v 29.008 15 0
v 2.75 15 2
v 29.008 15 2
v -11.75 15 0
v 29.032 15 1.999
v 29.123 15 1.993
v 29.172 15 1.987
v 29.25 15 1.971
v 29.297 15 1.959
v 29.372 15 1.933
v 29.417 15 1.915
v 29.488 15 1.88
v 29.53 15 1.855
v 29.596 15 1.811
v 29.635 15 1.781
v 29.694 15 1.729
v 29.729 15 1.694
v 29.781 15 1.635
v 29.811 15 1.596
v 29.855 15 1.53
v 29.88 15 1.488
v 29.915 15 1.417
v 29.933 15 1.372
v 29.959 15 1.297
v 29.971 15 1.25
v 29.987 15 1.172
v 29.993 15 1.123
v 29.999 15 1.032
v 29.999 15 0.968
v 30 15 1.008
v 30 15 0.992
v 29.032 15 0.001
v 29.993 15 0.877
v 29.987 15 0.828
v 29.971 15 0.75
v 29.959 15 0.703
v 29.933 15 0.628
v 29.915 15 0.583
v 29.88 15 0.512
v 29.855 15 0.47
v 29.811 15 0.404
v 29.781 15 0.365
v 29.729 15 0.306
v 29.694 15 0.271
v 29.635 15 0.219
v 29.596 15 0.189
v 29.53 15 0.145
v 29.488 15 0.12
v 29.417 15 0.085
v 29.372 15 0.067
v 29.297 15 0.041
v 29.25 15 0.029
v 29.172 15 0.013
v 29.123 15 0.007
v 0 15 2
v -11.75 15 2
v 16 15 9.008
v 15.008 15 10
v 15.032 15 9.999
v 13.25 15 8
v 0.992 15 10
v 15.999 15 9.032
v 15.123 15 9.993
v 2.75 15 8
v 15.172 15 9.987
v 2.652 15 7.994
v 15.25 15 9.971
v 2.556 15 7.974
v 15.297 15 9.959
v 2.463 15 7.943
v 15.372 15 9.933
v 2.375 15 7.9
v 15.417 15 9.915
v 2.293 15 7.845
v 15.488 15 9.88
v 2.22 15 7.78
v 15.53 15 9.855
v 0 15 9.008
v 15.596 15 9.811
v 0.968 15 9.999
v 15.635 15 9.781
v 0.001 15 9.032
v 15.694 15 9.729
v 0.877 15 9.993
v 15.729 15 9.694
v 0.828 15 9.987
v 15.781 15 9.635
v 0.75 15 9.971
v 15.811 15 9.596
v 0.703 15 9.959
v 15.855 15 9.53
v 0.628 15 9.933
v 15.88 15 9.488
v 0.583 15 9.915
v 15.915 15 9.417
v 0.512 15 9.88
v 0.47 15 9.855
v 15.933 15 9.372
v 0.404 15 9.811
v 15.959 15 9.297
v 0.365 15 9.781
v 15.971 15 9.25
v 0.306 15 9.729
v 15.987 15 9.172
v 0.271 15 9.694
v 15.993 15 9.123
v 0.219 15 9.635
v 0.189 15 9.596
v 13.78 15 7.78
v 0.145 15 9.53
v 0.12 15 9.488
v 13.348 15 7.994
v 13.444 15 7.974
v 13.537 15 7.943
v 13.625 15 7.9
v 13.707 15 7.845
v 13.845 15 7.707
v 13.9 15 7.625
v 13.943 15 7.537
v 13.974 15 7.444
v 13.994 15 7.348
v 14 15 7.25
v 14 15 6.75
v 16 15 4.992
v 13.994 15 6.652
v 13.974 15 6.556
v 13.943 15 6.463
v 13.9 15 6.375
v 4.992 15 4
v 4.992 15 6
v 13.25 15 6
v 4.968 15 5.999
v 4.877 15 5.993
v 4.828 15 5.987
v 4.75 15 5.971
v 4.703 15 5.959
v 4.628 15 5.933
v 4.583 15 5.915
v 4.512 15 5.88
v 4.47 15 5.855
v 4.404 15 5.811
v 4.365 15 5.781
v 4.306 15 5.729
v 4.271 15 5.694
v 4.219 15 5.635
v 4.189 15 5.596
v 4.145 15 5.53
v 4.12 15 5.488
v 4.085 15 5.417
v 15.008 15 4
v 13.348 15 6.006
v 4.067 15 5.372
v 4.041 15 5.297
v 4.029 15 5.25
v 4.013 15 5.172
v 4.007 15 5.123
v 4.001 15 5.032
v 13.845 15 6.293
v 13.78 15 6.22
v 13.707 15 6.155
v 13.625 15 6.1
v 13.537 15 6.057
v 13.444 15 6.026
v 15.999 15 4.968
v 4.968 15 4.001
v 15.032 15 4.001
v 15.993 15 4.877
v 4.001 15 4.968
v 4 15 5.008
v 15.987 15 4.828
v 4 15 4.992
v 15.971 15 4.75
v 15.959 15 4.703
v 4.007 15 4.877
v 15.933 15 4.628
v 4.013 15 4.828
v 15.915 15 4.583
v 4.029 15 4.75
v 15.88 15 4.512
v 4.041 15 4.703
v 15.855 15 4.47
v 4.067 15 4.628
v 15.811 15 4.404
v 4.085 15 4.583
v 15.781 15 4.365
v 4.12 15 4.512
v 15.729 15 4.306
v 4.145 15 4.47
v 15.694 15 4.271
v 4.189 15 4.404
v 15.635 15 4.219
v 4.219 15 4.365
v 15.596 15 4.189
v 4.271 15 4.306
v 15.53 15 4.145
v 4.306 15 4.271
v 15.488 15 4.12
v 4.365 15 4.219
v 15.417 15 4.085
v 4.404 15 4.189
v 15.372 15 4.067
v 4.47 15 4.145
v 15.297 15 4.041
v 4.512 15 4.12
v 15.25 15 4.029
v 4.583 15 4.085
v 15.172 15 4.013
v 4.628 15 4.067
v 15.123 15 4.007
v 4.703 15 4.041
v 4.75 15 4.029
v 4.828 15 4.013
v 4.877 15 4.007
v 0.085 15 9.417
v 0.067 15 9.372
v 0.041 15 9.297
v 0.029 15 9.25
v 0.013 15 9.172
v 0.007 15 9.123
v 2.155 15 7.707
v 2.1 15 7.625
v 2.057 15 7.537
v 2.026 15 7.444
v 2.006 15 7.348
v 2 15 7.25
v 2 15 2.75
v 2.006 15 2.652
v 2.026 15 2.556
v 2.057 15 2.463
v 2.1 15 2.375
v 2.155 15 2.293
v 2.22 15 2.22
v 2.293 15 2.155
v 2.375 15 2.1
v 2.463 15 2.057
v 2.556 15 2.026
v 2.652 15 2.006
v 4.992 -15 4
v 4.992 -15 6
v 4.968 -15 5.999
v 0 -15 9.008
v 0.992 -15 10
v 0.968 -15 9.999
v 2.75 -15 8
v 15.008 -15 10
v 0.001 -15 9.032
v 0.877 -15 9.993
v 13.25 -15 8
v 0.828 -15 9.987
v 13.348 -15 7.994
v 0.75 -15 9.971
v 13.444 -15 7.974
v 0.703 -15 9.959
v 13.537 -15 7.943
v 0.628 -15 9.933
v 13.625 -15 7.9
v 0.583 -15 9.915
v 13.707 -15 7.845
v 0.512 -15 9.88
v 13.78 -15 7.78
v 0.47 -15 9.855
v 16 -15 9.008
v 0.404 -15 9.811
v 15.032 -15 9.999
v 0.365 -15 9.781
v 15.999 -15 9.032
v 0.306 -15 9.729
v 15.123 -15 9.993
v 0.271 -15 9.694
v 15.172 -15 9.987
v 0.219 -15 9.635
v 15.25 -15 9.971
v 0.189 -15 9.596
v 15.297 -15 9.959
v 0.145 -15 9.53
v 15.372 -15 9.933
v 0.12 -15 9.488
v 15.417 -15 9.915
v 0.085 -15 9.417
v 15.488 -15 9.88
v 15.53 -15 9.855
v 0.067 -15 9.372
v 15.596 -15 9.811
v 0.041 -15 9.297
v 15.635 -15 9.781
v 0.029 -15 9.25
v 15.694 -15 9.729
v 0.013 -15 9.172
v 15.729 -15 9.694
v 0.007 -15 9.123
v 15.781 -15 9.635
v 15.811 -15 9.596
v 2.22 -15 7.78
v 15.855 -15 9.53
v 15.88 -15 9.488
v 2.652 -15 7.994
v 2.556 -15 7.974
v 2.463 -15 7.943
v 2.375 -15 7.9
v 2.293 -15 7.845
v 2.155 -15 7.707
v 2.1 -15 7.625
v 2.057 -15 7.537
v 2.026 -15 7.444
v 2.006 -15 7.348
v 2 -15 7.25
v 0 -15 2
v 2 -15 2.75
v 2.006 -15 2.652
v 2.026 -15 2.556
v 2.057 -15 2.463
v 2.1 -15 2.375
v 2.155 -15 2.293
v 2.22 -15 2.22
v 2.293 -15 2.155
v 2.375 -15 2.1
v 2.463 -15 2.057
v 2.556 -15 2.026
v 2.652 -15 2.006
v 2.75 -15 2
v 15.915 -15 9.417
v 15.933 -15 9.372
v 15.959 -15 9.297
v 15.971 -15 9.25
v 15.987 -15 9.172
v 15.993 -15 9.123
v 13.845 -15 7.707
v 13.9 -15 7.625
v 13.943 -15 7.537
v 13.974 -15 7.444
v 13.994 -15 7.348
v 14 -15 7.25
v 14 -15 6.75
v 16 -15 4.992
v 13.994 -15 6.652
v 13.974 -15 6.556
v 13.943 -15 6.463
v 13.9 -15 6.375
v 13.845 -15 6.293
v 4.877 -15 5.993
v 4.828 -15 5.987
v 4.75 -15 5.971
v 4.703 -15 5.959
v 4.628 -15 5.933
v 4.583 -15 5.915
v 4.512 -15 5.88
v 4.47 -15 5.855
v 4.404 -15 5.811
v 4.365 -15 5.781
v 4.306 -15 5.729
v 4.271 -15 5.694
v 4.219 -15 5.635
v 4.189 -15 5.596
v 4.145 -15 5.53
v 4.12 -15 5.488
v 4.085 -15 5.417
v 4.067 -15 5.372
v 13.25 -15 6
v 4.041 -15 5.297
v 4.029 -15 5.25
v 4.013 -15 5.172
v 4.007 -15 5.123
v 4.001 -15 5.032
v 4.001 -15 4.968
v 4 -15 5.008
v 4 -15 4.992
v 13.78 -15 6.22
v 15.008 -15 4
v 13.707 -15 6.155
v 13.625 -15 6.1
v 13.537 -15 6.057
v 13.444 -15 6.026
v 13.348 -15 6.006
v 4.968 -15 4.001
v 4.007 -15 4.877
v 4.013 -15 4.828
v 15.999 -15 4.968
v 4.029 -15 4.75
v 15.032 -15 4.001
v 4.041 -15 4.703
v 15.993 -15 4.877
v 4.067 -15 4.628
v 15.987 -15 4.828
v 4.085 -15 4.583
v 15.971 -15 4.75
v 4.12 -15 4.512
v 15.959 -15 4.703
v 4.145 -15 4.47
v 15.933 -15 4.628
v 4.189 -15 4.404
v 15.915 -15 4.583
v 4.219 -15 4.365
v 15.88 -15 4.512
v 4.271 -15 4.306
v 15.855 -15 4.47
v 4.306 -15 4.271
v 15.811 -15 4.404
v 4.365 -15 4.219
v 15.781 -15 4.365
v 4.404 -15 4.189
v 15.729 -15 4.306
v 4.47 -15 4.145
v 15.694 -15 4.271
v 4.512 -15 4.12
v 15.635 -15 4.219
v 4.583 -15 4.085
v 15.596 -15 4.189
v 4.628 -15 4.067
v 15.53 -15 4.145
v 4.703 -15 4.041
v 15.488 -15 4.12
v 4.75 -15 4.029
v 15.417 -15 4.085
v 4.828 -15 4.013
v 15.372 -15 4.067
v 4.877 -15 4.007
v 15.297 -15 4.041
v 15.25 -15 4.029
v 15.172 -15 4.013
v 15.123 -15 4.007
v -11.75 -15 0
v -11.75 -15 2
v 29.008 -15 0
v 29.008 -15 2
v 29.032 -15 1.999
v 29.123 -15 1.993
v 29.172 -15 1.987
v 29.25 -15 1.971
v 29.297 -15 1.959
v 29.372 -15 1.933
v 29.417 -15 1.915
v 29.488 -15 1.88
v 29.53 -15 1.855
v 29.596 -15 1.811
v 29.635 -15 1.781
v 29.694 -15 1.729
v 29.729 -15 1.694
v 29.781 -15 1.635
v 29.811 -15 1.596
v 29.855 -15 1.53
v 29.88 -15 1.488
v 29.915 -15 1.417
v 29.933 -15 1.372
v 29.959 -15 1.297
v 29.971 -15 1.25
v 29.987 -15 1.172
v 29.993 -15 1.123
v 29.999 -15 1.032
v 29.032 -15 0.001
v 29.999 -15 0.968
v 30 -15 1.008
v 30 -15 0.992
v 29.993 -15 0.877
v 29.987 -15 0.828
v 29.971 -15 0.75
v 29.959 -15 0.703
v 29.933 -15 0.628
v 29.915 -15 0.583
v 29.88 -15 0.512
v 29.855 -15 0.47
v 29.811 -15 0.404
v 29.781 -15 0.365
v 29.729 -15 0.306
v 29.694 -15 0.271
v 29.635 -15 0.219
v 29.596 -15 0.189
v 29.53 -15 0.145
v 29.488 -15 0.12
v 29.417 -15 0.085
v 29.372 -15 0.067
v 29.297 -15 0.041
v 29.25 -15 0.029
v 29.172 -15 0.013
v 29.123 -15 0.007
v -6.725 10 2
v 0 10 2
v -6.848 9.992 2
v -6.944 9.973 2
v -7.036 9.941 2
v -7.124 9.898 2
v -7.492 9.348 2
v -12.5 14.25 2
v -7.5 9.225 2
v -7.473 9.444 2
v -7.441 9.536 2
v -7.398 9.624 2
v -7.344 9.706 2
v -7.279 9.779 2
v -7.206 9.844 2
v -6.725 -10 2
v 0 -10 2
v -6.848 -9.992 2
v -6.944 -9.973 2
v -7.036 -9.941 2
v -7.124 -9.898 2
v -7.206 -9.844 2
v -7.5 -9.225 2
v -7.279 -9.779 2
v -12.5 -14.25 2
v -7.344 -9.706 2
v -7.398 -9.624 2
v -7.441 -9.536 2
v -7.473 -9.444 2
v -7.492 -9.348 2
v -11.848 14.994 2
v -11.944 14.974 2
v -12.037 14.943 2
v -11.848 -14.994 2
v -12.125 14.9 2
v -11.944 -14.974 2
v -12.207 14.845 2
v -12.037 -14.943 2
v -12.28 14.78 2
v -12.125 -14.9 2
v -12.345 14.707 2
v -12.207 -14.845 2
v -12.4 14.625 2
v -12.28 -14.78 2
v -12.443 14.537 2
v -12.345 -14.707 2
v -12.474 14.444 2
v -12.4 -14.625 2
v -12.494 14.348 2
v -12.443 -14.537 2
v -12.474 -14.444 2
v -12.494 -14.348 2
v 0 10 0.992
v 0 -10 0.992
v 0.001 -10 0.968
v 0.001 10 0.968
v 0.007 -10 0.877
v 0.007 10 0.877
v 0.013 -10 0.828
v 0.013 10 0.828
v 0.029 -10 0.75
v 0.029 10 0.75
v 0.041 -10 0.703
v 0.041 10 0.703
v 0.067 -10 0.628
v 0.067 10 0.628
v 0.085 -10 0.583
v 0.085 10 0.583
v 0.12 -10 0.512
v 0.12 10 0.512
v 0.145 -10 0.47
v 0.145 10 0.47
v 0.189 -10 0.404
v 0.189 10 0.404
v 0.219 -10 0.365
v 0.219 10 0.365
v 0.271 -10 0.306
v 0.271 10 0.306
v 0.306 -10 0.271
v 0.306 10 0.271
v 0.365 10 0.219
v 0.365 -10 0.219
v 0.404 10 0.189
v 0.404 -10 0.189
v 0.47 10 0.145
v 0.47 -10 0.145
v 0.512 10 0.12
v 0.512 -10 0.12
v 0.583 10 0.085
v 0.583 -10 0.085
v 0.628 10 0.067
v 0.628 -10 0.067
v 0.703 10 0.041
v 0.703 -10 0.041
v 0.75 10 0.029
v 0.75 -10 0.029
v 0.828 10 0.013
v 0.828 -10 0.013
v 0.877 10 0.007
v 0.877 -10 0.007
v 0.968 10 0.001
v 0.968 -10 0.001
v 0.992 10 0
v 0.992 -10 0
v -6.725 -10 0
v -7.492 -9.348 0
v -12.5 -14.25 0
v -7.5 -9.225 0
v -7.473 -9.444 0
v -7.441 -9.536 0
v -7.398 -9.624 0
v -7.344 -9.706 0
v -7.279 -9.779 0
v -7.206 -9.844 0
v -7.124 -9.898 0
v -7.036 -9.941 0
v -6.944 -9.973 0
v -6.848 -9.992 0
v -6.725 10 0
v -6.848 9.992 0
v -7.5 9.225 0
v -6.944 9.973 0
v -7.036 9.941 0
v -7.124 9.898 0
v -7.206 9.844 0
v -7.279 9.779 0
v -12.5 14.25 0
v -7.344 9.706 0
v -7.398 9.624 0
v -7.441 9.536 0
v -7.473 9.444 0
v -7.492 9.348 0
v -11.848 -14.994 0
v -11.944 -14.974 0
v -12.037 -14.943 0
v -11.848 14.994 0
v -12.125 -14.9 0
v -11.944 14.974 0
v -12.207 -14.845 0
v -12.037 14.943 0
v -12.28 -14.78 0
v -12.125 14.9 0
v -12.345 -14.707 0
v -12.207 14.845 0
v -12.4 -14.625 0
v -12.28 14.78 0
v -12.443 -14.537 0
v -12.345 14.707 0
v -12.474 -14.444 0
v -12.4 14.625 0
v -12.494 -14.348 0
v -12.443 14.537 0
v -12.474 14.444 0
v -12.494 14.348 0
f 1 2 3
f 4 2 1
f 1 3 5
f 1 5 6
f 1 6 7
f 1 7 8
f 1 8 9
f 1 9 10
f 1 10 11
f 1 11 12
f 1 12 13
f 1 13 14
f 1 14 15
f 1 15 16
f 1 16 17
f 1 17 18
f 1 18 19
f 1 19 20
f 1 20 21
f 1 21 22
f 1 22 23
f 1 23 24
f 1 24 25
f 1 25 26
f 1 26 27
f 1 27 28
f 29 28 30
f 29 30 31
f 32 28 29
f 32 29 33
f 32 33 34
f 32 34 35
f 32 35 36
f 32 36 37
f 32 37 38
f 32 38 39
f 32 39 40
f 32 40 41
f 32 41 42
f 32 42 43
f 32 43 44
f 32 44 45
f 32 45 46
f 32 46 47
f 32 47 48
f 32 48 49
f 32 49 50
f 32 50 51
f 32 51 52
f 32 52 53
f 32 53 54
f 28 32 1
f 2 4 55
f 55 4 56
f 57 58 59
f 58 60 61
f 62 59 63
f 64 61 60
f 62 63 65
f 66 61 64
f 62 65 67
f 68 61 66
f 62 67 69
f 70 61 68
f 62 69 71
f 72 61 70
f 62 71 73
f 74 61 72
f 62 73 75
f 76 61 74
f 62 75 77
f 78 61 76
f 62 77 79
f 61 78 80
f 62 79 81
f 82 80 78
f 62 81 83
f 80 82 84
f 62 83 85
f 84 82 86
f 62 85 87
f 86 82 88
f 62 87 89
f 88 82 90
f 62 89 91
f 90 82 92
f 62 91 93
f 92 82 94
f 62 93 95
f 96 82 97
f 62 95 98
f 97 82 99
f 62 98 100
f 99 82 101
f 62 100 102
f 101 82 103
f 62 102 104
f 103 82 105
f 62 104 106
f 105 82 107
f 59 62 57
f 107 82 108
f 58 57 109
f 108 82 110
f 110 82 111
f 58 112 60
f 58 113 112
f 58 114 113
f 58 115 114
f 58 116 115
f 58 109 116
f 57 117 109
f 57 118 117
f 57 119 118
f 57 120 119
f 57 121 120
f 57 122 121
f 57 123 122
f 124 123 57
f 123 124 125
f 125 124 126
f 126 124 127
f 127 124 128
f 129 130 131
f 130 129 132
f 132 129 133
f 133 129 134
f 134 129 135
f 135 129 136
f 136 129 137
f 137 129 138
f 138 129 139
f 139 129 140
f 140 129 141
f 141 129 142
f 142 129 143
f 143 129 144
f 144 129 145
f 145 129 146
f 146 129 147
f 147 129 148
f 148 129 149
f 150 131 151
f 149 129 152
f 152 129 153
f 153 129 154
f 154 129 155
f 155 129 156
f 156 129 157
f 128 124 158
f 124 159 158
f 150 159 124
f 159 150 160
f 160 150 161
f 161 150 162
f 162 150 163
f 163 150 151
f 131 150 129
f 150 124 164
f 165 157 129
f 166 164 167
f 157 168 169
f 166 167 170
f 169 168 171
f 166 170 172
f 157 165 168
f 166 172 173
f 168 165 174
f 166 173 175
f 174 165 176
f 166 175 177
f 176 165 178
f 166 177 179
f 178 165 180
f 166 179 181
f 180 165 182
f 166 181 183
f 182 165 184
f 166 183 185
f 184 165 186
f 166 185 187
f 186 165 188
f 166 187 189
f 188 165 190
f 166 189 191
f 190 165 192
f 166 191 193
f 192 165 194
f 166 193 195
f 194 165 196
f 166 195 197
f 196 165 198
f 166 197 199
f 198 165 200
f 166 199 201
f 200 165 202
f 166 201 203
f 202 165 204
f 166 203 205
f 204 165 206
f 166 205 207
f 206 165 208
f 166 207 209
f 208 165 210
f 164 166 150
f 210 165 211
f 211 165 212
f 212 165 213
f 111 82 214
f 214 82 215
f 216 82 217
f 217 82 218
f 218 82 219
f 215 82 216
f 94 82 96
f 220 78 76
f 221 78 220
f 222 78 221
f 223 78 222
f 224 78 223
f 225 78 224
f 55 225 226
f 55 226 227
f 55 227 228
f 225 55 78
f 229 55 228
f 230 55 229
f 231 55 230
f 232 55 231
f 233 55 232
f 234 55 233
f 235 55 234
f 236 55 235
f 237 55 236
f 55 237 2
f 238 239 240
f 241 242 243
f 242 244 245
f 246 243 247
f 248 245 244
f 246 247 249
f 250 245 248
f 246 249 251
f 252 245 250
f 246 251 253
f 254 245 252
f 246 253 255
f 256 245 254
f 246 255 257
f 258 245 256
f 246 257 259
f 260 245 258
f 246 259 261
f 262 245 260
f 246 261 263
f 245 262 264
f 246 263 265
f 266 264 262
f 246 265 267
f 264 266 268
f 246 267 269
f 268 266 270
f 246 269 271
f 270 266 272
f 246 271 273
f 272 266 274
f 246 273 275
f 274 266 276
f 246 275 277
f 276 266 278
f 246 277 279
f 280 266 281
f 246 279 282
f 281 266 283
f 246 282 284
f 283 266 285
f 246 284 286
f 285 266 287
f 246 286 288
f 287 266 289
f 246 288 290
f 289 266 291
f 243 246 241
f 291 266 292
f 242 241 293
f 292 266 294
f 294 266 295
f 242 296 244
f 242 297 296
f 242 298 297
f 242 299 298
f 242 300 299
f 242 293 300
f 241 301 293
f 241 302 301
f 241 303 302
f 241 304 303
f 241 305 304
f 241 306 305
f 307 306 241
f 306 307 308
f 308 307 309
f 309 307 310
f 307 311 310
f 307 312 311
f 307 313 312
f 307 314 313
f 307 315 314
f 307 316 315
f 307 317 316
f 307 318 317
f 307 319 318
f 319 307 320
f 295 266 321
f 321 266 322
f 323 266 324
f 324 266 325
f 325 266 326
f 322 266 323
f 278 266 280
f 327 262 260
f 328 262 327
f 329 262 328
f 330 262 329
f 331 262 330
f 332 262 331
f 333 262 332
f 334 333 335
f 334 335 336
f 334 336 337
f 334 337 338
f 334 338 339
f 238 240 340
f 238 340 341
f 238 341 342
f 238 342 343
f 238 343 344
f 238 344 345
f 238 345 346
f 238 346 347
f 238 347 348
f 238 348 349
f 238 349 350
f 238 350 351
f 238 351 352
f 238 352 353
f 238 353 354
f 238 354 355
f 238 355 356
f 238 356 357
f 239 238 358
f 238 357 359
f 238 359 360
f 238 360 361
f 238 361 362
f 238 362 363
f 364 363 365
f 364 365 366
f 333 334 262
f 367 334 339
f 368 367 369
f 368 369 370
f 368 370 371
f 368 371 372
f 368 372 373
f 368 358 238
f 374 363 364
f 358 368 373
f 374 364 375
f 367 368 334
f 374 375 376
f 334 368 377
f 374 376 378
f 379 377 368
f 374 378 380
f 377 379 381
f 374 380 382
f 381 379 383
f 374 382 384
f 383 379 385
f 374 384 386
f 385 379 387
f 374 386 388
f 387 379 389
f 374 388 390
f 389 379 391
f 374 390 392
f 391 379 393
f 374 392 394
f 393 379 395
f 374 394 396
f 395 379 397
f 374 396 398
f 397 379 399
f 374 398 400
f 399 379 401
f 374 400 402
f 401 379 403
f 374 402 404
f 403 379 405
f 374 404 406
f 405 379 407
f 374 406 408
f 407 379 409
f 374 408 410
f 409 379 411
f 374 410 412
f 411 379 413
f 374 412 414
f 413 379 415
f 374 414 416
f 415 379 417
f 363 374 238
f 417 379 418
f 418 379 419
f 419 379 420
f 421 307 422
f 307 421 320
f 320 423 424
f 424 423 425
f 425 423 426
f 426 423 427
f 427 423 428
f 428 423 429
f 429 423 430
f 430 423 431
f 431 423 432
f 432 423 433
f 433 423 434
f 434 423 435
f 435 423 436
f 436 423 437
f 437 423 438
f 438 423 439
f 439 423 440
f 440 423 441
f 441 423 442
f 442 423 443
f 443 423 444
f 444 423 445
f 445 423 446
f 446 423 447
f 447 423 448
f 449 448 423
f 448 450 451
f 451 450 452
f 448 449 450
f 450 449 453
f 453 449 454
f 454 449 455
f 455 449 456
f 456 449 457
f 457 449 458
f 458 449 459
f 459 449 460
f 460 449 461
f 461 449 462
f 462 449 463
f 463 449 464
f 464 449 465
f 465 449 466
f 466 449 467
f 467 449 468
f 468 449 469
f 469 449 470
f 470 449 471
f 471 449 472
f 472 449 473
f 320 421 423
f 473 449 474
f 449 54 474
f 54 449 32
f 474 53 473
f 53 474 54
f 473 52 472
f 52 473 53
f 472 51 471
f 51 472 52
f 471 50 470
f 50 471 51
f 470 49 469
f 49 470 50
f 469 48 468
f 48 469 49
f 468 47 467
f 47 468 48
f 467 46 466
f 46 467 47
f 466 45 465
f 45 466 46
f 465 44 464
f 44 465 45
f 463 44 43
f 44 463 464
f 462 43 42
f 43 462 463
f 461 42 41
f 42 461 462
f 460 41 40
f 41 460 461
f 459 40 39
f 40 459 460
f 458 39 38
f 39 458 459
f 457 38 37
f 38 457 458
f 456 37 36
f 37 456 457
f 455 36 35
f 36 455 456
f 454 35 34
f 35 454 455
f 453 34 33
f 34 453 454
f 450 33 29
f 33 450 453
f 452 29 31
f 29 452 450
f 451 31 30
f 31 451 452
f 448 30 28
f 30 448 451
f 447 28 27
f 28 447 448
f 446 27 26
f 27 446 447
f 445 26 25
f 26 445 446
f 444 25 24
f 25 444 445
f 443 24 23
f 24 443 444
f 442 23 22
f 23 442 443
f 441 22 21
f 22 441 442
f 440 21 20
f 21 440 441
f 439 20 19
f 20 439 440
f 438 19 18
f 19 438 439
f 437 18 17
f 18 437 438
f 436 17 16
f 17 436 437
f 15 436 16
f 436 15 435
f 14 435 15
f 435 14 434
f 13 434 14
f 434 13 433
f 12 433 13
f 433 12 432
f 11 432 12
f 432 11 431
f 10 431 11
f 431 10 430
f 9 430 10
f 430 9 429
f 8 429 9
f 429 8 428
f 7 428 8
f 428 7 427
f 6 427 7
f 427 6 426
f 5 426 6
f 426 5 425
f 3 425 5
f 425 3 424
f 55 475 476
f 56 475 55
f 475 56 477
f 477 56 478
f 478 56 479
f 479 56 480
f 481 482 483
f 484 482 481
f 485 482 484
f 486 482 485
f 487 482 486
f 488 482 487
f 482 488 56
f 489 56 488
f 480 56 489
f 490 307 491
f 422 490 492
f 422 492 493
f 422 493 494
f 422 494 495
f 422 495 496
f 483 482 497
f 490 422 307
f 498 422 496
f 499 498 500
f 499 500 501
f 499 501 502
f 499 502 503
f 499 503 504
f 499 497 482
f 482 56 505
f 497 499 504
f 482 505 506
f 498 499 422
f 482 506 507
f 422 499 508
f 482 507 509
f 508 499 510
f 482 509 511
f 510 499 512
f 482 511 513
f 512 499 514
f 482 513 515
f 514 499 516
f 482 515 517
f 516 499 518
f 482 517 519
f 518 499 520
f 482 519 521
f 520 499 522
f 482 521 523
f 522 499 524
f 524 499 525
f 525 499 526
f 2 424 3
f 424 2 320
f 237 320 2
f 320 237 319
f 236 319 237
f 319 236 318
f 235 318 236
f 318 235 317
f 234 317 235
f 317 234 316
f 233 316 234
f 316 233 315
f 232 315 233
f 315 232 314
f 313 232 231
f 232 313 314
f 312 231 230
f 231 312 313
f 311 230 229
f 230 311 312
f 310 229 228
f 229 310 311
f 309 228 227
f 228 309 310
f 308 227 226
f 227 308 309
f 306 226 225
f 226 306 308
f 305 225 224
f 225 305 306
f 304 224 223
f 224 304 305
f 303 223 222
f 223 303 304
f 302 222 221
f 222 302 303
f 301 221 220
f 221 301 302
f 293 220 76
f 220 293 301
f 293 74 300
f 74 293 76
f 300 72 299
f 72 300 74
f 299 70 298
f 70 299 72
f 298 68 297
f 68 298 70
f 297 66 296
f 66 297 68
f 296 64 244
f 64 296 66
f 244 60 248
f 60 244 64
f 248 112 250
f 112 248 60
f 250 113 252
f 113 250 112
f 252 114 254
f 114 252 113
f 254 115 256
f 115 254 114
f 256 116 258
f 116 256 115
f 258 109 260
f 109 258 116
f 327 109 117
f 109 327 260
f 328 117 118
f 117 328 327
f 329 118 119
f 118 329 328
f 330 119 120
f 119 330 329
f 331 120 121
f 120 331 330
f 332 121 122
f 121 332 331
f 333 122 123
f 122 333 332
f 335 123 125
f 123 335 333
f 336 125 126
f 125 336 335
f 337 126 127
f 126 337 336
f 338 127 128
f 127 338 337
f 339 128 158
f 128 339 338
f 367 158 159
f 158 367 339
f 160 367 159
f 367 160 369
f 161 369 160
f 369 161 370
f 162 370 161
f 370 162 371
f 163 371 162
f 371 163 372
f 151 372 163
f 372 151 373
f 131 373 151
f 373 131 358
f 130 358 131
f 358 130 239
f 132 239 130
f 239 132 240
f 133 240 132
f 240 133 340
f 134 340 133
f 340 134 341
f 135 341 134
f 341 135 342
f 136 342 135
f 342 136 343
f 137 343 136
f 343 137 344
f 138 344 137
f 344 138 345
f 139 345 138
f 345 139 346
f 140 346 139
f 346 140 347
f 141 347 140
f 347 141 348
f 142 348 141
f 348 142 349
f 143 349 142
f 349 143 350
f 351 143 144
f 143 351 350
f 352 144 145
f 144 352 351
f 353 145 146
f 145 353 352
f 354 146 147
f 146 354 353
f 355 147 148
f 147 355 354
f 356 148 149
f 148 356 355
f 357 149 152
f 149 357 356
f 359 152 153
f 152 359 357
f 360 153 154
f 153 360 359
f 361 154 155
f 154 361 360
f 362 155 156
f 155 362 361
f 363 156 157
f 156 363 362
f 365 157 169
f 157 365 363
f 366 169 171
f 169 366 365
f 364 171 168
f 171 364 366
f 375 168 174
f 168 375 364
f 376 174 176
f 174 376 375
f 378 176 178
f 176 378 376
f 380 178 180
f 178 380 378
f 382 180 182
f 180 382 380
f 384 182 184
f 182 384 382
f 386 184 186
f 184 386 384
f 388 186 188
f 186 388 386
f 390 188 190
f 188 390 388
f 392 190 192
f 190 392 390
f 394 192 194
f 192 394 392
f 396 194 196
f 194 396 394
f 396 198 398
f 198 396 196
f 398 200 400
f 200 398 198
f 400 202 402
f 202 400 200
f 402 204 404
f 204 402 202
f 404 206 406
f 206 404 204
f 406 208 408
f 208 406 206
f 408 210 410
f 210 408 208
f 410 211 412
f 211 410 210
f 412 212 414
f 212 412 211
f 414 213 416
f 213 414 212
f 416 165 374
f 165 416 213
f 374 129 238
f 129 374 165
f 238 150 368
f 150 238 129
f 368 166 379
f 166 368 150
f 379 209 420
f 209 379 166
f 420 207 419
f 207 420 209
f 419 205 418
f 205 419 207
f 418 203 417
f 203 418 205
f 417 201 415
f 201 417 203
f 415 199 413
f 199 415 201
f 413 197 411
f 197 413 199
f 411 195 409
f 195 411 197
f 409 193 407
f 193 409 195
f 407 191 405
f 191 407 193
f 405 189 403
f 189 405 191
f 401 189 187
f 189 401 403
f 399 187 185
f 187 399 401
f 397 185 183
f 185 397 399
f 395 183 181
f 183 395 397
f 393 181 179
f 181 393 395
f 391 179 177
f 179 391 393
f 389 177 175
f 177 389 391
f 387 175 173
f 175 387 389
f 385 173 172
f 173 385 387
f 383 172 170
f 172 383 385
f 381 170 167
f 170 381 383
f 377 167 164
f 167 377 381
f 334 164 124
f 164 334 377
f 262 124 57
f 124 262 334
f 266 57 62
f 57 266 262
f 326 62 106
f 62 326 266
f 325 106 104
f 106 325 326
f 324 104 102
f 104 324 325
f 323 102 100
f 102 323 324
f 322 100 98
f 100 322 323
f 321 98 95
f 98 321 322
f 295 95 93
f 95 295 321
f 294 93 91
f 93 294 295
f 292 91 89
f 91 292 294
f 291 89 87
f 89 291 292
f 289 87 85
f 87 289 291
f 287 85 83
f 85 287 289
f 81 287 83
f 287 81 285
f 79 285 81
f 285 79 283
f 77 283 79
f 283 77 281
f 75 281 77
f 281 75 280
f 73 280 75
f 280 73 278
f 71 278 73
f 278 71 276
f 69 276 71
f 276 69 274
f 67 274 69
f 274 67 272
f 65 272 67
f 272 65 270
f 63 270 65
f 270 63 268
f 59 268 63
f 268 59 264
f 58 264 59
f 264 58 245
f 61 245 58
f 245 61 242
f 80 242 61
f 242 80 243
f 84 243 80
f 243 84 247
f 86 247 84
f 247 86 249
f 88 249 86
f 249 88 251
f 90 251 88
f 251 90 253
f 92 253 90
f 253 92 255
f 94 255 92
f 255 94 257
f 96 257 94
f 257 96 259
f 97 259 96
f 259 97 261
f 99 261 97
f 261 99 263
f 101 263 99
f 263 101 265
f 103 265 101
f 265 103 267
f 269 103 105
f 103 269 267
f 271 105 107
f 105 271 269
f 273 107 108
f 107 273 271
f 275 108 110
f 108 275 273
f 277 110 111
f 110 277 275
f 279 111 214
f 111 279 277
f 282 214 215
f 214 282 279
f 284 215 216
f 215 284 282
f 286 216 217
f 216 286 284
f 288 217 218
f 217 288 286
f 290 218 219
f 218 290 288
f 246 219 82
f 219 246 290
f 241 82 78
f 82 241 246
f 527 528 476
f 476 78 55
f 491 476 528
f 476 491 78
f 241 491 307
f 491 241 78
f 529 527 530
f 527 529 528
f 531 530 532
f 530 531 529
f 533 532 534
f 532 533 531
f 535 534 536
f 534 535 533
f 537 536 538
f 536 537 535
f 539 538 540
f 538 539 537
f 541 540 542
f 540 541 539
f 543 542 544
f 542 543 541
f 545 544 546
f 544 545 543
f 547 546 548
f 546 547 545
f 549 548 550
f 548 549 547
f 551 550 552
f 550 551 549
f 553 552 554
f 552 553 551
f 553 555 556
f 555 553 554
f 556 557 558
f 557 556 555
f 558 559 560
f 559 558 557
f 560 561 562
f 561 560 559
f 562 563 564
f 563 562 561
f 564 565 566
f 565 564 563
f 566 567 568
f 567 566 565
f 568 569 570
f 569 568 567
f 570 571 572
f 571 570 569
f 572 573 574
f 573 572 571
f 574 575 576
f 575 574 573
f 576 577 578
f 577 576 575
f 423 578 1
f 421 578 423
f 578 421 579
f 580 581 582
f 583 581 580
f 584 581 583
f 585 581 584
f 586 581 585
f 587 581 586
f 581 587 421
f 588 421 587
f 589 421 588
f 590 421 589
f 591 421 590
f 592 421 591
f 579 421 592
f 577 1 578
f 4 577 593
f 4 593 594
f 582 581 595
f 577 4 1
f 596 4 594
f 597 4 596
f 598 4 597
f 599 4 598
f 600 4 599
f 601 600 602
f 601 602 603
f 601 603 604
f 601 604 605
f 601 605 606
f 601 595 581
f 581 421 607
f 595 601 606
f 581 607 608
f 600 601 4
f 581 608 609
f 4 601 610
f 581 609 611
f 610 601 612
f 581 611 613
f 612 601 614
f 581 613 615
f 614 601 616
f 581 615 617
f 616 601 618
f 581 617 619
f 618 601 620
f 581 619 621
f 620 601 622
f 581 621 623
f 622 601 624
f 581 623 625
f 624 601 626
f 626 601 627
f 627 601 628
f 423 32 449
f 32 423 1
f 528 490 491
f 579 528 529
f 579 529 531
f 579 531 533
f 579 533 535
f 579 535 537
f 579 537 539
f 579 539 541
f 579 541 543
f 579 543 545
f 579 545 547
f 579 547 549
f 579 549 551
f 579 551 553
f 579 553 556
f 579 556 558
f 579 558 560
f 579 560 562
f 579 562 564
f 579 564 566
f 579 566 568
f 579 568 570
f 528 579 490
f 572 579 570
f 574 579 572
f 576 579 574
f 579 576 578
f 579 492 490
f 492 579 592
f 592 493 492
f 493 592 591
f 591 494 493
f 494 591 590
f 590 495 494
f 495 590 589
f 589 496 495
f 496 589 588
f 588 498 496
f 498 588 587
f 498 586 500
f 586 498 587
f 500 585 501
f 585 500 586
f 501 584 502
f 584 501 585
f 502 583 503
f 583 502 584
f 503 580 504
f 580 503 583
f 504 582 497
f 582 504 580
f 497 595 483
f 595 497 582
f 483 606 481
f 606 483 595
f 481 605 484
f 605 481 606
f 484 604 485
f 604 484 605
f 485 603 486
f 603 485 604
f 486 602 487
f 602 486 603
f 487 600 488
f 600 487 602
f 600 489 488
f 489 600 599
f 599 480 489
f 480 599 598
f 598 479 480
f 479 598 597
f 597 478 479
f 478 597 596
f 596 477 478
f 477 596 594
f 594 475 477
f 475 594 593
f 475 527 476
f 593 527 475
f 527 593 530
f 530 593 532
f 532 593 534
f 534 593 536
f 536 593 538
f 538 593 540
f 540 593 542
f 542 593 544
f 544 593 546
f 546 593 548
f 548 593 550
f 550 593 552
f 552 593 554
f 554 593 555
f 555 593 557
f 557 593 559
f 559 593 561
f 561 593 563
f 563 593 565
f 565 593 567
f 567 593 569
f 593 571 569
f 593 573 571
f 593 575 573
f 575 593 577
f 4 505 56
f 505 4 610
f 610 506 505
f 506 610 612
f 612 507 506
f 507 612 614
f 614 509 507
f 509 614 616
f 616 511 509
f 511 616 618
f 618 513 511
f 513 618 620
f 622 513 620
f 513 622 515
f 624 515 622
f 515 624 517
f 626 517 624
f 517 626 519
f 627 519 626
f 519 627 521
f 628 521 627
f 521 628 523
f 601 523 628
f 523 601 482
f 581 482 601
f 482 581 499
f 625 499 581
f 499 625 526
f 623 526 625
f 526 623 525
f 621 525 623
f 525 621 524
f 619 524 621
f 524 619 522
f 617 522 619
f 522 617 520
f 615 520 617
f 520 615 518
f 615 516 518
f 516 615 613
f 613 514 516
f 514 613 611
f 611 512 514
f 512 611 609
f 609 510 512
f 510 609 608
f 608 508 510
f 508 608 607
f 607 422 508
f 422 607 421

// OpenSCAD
w = 30; // Width
w_fold = 10; // How much to fold
t = 2; // Thickness of plastic
t_handle = 5; // Thickness of the handle
l = 30; // Length

gap = 2; // Where the fabric goes
round = 0.75;

$fn = 48;


module capsule_2d(x, y, r) {
    r = is_undef(r) ? t * 0.49 : r;

    offset(r)
    offset(- r)
        square([x, y]);
}


module profile() {
    offset(- round)
    offset(round) {
        // Bottom
        capsule_2d(w, t);

        // Left
        capsule_2d(t, t * 3 + gap * 2);

        // Top
        translate([0, t * 2 + gap * 2])
            capsule_2d(t * 2 + w_fold + gap, t);

        // Right
        translate([t + gap + w_fold, t + gap])
            capsule_2d(t, t * 2 + gap);

        // Center
        translate([t + gap, t + gap])
            capsule_2d(t + w_fold, t);
    }
}


module profile_extrusion() {
    rotate([90, 0, 0])
    linear_extrude(l, center = true)
        profile();
}


module handle() {
    linear_extrude(t)
    offset(round)
    offset(- round * 2)
    offset(round)
    translate([t_handle, 0]) {
        translate([- w / 2, 0])
            square([t_handle, l], center = true);

        translate([- w / 4, l / 2 - t_handle / 2])
            square([w / 2, t_handle], center = true);

        translate([- w / 4, - l / 2 + t_handle / 2])
            square([w / 2, t_handle], center = true);
    }
}


module assembly() {
    profile_extrusion();
    handle();
}


assembly();
